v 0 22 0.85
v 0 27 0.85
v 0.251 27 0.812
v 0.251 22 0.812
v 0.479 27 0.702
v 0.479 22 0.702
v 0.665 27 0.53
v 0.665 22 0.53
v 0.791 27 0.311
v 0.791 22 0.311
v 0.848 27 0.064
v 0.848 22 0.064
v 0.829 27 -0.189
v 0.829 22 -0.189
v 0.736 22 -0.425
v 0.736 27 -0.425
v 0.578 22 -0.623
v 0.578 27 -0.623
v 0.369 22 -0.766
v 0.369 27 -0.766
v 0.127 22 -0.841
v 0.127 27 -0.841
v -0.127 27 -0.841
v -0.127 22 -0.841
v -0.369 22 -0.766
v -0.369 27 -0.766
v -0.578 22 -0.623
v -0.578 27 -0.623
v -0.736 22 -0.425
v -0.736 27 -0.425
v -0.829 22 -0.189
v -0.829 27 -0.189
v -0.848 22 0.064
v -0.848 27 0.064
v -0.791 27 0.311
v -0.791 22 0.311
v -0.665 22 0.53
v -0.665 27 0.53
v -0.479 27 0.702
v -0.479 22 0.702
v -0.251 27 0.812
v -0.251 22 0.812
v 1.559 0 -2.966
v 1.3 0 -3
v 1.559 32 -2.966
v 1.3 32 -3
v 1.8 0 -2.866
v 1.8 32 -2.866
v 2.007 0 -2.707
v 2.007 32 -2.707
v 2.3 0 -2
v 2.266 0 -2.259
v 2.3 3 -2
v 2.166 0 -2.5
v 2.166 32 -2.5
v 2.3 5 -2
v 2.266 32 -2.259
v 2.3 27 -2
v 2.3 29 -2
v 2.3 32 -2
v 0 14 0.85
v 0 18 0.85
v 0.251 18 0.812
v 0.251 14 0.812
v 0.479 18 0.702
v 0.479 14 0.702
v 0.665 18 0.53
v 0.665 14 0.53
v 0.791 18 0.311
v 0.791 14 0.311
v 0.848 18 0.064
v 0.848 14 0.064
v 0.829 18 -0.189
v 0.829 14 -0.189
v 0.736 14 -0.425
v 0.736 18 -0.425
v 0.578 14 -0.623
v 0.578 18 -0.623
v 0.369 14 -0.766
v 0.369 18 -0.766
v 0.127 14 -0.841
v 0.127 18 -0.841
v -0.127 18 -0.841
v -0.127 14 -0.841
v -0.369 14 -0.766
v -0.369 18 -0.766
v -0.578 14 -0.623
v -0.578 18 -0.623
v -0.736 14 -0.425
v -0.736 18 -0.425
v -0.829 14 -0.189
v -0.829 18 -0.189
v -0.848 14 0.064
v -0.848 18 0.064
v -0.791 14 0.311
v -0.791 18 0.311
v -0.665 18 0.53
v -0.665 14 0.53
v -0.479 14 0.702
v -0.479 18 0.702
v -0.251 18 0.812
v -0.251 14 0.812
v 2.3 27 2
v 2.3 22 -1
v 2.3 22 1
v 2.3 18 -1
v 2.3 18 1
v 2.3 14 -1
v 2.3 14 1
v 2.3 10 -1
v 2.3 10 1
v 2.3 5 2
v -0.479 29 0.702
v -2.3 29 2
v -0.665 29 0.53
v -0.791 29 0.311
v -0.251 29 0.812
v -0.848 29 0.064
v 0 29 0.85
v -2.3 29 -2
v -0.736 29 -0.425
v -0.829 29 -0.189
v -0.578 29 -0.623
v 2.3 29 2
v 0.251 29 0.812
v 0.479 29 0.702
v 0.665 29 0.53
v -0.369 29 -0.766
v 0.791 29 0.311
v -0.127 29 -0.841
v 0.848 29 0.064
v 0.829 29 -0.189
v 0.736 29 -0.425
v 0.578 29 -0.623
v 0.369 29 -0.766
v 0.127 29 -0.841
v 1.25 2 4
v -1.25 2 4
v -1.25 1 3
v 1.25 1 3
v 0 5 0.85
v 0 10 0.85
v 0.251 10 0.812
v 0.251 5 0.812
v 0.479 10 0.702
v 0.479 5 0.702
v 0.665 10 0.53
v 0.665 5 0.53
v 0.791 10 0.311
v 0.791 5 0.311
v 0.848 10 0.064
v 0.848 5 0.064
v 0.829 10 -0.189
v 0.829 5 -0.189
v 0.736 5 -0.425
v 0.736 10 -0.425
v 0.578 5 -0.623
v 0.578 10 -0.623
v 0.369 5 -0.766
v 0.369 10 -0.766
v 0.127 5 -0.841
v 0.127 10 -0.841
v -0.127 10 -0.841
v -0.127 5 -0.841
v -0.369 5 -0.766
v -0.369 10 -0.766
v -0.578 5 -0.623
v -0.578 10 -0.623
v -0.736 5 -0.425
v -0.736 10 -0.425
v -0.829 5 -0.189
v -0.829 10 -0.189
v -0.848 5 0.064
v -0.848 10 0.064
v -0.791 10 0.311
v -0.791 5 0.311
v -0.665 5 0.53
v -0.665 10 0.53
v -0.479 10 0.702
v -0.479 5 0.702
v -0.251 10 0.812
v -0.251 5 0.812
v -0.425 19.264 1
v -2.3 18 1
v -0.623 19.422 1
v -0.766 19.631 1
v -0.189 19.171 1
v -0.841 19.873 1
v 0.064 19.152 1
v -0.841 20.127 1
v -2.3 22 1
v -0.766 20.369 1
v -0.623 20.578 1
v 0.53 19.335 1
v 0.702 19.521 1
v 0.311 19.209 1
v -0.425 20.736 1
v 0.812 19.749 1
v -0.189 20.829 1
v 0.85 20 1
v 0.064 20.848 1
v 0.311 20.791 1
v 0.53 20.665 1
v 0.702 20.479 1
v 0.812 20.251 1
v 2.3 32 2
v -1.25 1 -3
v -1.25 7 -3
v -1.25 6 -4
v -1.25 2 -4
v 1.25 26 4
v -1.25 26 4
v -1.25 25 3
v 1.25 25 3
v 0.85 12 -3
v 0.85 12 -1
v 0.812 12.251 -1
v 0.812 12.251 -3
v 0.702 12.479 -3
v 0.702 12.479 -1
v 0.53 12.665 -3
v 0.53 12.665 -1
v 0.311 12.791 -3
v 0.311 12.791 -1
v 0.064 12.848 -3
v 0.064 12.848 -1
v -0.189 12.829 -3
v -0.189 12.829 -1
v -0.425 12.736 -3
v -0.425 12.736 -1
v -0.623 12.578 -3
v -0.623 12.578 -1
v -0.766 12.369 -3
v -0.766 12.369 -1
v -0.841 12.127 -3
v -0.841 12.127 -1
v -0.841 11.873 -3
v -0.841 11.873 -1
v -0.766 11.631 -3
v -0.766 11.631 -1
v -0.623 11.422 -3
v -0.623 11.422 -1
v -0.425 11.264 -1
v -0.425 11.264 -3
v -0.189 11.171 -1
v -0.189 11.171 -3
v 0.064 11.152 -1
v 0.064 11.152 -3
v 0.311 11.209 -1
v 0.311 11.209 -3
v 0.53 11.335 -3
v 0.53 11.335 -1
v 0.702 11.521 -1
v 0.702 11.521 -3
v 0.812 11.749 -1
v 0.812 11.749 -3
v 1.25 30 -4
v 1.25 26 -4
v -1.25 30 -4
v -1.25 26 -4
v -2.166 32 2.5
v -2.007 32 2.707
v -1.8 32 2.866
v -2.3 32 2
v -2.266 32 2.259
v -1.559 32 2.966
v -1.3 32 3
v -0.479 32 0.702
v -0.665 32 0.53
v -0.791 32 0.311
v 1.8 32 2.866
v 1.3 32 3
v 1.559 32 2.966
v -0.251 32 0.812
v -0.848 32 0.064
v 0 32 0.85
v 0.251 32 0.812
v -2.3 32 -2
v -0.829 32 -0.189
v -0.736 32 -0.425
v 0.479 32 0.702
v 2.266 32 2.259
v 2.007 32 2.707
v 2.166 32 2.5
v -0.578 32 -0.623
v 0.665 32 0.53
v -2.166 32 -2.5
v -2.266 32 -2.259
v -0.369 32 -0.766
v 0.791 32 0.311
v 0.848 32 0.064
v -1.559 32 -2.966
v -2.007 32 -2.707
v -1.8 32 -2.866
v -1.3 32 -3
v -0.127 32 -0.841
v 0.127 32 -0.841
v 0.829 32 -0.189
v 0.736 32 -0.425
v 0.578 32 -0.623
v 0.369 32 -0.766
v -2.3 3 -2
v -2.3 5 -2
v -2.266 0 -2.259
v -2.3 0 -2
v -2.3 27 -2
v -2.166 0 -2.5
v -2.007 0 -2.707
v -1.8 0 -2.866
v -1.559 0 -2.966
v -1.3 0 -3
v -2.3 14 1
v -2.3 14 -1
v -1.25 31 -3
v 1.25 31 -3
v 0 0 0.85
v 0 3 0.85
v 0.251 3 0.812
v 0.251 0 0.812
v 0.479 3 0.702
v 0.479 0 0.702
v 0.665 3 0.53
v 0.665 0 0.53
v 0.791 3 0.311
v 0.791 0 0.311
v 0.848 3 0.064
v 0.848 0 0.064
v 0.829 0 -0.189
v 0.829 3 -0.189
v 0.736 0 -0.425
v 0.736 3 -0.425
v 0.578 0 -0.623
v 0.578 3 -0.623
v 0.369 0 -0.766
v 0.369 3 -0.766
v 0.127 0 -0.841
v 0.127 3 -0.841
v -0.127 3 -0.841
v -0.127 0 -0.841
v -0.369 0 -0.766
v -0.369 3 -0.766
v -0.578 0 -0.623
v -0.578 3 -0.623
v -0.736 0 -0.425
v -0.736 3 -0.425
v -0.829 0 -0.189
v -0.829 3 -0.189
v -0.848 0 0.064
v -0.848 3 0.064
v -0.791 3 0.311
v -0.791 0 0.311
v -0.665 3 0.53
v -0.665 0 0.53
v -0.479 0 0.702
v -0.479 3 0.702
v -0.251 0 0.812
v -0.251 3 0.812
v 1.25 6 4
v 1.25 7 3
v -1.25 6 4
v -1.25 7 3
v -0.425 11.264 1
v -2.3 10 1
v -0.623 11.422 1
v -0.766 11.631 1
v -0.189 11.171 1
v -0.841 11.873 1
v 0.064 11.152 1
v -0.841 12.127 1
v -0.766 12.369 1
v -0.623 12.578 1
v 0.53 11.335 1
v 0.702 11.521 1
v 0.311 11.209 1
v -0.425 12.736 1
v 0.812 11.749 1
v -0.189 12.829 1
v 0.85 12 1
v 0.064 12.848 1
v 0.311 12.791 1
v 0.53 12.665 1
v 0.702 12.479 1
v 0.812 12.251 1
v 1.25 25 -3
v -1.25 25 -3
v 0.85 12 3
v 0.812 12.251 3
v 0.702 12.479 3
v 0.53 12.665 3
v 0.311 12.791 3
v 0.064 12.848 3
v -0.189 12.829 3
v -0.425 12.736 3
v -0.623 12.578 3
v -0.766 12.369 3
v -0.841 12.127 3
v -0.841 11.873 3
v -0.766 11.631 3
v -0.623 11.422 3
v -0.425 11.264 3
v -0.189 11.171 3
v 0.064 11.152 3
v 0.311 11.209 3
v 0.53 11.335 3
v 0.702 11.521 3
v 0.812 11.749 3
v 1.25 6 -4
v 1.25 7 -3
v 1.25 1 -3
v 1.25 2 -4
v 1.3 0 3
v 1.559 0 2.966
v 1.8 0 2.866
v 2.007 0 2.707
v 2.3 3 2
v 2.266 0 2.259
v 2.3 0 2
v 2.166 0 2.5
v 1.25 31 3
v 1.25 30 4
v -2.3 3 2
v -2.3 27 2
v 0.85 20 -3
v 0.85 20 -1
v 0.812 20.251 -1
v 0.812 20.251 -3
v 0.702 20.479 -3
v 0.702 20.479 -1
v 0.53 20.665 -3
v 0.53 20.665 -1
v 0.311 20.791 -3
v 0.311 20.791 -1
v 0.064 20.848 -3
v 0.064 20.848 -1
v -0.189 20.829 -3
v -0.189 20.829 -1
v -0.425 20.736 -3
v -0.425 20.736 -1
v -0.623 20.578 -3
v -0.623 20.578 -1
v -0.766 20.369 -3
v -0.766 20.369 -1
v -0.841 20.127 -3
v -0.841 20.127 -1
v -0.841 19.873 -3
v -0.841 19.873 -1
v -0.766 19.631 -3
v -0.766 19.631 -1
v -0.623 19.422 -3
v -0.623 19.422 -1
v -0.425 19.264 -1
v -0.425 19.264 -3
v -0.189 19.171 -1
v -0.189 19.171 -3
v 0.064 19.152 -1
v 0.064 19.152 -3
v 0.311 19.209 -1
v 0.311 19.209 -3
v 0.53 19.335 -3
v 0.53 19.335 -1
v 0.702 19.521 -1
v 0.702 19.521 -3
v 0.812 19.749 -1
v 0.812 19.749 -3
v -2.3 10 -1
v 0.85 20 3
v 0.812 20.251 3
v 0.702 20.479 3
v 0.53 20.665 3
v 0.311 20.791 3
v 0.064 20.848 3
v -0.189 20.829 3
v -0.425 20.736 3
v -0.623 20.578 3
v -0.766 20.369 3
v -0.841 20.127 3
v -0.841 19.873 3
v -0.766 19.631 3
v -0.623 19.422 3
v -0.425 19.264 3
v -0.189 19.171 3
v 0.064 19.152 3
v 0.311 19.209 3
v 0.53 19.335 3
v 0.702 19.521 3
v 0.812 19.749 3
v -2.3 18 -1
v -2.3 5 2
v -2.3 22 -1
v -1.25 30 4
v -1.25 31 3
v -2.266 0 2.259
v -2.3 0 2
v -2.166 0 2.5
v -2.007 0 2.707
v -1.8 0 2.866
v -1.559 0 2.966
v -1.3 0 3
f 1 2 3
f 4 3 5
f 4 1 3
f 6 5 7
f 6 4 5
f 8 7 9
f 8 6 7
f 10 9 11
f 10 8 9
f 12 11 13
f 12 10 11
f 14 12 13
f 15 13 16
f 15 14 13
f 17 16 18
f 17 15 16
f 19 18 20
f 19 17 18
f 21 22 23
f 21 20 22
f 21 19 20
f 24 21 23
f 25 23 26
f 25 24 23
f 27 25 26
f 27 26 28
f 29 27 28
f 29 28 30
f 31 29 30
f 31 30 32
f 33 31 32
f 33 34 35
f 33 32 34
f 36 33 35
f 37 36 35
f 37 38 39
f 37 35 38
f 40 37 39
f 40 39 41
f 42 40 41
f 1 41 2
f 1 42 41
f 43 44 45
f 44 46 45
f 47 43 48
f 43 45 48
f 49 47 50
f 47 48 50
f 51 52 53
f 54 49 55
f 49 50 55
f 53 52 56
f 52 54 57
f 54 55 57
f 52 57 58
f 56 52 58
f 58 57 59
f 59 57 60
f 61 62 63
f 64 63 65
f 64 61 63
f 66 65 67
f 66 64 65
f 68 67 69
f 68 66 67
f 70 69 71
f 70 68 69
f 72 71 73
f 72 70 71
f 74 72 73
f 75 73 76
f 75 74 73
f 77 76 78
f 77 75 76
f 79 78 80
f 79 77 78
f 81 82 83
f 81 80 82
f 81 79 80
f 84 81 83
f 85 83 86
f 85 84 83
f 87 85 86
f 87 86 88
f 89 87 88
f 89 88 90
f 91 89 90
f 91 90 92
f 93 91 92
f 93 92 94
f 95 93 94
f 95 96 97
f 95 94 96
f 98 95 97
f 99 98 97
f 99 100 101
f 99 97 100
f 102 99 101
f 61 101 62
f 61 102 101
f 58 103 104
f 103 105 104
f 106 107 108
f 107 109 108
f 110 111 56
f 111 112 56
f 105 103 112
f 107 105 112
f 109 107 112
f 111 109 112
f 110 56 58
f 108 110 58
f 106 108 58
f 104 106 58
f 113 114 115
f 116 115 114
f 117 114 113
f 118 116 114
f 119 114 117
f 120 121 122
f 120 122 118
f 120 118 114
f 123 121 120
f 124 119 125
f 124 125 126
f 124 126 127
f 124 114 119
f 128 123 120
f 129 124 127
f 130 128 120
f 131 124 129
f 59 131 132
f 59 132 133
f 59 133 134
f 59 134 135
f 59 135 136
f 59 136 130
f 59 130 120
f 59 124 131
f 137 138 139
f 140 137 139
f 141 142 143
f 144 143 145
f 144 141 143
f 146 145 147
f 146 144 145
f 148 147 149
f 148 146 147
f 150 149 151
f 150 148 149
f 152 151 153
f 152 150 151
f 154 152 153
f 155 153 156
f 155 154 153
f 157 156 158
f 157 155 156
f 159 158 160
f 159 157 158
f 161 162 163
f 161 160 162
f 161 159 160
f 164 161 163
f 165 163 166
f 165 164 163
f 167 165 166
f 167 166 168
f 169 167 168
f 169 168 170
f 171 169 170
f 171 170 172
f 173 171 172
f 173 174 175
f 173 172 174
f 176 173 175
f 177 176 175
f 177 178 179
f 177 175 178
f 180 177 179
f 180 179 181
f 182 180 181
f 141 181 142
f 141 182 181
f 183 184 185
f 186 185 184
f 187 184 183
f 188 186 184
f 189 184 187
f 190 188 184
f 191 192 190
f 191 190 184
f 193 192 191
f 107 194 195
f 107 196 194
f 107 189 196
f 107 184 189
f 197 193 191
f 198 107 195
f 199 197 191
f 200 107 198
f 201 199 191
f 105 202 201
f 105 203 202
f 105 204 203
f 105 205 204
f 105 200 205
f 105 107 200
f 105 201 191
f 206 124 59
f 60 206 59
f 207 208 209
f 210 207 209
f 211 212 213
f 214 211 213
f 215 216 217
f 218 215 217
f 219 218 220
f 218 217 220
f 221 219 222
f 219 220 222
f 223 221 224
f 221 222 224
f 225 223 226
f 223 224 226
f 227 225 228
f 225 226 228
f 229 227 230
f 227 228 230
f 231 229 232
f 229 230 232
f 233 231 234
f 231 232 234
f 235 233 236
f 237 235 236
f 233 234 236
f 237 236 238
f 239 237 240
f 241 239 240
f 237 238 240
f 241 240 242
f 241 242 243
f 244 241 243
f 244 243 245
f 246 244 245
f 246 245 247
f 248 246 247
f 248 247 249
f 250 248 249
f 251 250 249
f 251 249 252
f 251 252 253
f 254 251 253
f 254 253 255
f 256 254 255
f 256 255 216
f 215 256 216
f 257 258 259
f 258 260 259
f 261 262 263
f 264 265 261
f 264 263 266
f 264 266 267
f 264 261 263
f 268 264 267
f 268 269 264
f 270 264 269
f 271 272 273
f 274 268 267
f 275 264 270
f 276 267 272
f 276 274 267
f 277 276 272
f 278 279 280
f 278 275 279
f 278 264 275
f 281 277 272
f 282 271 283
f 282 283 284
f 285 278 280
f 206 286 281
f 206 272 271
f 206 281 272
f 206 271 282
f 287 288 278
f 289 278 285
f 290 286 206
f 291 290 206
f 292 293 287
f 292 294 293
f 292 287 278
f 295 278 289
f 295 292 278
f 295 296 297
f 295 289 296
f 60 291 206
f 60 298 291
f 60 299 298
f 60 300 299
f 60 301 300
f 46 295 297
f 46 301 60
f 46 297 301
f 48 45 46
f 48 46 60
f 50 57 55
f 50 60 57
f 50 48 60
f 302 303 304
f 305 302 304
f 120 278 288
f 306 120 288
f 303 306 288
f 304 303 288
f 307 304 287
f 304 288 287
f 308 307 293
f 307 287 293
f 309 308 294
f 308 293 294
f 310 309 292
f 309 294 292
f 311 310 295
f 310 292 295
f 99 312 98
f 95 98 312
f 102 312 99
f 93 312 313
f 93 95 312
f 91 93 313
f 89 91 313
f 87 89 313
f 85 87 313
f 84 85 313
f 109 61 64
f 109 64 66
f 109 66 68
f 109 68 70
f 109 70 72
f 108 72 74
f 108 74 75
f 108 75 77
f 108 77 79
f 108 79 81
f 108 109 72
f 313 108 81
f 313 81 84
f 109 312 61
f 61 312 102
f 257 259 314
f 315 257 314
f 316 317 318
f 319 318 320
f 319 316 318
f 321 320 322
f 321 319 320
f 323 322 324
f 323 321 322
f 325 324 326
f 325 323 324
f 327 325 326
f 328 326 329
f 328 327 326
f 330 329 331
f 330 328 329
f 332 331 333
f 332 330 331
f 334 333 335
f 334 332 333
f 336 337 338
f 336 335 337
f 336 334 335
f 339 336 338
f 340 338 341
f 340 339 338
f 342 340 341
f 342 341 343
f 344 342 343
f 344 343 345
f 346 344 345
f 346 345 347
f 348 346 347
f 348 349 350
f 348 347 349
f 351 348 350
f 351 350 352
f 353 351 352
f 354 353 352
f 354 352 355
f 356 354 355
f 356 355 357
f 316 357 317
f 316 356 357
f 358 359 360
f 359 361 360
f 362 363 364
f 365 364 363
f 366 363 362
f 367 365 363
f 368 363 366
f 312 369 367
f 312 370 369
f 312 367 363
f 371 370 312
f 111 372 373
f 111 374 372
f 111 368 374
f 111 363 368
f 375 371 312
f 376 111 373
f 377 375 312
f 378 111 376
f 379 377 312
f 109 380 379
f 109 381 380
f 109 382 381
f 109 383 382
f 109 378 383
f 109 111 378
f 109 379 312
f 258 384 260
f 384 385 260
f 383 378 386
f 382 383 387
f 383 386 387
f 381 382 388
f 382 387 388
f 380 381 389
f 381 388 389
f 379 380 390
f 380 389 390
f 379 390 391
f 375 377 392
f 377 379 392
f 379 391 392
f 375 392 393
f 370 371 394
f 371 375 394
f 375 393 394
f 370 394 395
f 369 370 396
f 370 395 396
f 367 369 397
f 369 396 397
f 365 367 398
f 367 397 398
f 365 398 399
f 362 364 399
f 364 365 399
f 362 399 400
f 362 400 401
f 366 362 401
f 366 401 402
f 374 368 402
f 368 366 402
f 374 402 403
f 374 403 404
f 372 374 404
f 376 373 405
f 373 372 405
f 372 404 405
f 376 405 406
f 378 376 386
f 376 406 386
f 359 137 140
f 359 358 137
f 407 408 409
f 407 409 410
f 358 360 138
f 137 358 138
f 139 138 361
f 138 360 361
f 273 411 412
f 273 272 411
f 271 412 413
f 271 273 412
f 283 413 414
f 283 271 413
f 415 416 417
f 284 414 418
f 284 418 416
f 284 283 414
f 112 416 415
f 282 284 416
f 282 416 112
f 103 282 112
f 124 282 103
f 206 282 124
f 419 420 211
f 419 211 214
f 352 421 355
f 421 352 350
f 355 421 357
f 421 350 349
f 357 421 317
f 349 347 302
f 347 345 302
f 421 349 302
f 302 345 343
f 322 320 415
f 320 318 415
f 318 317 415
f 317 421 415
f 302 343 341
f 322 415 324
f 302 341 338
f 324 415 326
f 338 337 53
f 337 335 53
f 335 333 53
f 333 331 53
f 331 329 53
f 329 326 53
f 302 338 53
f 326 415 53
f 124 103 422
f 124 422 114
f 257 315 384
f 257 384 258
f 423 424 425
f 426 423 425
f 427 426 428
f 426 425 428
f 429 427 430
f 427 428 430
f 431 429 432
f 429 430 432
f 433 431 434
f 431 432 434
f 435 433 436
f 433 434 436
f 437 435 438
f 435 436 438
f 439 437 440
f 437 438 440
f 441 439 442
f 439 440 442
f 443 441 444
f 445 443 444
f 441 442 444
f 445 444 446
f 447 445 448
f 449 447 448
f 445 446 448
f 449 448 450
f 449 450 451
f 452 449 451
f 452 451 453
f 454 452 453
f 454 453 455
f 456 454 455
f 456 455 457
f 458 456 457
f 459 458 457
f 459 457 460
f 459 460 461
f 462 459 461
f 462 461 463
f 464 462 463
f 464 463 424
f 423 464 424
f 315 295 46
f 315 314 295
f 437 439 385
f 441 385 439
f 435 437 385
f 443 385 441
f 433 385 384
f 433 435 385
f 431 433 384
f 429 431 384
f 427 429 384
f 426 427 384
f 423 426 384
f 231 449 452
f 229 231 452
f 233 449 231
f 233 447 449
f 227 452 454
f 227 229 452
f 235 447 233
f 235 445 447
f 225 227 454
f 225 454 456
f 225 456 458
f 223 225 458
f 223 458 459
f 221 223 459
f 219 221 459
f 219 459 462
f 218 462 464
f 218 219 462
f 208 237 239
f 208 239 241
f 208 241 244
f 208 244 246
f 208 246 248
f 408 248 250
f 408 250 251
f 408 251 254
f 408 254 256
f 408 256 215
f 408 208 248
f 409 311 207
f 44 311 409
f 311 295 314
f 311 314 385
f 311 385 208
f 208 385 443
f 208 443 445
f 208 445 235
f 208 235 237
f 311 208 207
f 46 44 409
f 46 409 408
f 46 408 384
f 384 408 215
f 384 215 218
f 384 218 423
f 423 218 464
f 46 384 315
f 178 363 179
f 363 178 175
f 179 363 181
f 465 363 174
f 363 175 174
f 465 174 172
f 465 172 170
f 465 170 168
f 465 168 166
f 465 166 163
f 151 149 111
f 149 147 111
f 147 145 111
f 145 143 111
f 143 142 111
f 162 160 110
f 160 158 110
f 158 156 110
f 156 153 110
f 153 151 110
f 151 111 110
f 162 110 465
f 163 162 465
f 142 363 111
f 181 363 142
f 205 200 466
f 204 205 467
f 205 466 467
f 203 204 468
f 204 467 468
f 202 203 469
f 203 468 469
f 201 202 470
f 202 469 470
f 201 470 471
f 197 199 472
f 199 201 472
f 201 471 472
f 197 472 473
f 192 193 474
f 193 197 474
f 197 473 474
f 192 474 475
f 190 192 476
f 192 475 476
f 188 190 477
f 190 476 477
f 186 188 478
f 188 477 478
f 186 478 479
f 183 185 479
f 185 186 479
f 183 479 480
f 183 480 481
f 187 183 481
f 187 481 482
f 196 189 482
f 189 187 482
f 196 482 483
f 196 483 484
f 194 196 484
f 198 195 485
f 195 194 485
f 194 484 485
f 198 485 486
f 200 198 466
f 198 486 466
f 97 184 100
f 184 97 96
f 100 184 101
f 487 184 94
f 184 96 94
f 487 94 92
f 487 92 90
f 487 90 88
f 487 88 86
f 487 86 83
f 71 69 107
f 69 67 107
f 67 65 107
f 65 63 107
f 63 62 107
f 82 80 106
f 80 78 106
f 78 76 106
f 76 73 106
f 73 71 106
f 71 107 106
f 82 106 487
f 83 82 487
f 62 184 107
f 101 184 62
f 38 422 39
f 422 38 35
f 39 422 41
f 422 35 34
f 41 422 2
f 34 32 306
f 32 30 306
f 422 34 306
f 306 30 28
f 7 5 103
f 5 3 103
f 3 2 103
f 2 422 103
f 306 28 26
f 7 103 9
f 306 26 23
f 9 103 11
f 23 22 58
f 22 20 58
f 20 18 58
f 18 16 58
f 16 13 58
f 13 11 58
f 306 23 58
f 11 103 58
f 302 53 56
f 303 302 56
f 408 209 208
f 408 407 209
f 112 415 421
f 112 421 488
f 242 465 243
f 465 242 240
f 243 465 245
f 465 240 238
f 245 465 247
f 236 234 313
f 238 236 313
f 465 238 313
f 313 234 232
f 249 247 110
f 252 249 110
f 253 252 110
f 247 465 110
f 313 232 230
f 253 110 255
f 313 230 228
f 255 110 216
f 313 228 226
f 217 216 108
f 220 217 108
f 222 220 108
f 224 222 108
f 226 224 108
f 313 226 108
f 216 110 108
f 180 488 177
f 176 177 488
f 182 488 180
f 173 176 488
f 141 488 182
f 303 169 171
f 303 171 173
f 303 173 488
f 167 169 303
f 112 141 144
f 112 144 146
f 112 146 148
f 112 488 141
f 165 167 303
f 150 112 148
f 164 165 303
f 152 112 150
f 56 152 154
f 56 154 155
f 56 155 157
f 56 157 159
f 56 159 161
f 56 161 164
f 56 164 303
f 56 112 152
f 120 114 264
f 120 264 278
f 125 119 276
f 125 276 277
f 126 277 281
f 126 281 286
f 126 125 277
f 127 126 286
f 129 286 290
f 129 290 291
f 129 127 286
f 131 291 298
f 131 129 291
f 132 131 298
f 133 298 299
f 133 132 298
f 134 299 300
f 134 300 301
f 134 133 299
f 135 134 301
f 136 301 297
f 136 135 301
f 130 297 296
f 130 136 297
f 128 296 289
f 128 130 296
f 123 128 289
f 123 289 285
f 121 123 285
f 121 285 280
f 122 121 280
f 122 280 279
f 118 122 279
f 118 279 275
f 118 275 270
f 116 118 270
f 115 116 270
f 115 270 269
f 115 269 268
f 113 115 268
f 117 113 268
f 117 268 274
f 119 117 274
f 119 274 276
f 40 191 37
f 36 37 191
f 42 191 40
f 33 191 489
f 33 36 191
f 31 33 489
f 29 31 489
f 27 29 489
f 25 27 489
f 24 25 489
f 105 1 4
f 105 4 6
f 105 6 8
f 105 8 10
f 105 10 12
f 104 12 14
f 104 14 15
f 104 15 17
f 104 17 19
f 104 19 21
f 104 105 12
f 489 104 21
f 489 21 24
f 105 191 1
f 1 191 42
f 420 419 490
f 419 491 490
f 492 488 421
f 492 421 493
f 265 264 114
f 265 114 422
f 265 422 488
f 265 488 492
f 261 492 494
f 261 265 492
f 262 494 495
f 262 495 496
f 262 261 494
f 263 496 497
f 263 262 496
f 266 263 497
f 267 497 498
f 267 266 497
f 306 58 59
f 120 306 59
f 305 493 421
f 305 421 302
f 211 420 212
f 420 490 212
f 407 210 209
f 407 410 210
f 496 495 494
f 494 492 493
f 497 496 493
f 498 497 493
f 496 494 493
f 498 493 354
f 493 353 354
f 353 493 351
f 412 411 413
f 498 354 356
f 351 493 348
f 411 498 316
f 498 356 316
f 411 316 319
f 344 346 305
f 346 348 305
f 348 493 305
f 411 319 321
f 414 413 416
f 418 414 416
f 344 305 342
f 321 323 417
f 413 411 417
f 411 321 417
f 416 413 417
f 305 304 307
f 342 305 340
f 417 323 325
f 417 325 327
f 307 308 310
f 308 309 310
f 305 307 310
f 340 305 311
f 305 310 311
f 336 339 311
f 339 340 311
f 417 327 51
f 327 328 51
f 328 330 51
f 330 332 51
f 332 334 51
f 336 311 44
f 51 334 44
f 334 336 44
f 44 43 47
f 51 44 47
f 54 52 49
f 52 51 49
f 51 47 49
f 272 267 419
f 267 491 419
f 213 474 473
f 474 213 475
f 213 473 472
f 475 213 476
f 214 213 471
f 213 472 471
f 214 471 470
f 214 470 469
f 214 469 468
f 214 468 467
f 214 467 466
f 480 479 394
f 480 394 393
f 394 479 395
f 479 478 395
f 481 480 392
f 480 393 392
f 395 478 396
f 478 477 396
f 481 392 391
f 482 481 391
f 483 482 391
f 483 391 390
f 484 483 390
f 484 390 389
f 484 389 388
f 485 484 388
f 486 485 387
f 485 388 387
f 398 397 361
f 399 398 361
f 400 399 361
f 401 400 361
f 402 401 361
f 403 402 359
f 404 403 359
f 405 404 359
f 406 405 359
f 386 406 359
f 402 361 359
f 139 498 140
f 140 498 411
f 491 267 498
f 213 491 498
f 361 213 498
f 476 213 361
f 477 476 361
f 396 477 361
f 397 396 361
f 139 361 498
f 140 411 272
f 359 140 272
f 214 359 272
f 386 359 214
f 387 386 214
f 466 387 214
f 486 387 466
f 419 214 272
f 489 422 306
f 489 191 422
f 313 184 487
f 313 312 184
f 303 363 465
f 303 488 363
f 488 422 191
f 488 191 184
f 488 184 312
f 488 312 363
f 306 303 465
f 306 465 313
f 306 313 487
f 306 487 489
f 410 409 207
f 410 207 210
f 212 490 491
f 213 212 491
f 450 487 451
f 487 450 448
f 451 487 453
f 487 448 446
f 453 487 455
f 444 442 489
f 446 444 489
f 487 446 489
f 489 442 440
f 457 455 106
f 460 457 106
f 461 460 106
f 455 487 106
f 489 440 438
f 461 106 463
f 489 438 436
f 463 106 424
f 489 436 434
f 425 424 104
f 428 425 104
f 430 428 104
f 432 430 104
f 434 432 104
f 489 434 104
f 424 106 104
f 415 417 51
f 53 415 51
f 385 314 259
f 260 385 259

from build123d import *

# Parameters (mm, degrees)
SKETCH1_W           = 4.6
SKETCH1_H           = 6
SKETCH1_R           = 0.85
EXTRUDE1_DEPTH      = 32
EXTRUDE2_DEPTH      = 1.25
SKETCH3_R           = 0.85
EXTRUDE4_DEPTH      = 8
FILLET2_R           = 1
SKETCH_W            = 4
SKETCH_H            = 2
EXTRUDE5_DEPTH      = 4.6
EXTRUDE5_DEPTH_BACK = 4.6
SKETCH4_W           = 2
SKETCH4_H           = 4
EXTRUDE6_DEPTH      = 3.3
EXTRUDE6_DEPTH_BACK = 3.3


with BuildPart() as part:
    # Sketch1 → Extrude1 (new body)
    with BuildSketch(Plane(origin=(0, 0, 0), x_dir=(1, 0, 0), z_dir=(0, 1, 0))):
        Rectangle(SKETCH1_W, SKETCH1_H)
        with Locations(Location((0, 0, 0), (0, 0, 270))):  # turned: the seam where the file's is
            Circle(SKETCH1_R, mode=Mode.SUBTRACT)
    extrude(amount=EXTRUDE1_DEPTH)

    # Sketch2 → Extrude2 (add, symmetric)
    with BuildSketch(Plane(origin=(0, 0, 0), x_dir=(0, 0, -1), z_dir=(1, 0, 0))):
        Polygon((-3, 25), (-3, 31), (-4, 30), (-4, 26), align=None)
        Polygon((3, 31), (3, 25), (4, 26), (4, 30), align=None)
        Polygon((-4, 2), (-3, 1), (-3, 7), (-4, 6), align=None)
        Polygon((4, 6), (3, 7), (3, 1), (4, 2), align=None)
    extrude(amount=EXTRUDE2_DEPTH, both=True)

    # Sketch3 → Extrude4 (cut, through all)
    with BuildSketch(Plane.XY.offset(3)):
        with Locations((0, 20)):
            Circle(SKETCH3_R)
        with Locations((0, 12)):
            Circle(SKETCH3_R)
    extrude(amount=-EXTRUDE4_DEPTH, mode=Mode.SUBTRACT)

    # Fillet2
    fillet2_edges = [part.edges().sort_by_distance(p)[0] for p in [
        (-2.3, 16, -3),
        (2.3, 16, -3),
        (2.3, 16, 3),
        (-2.3, 16, 3),
    ]]
    fillet(fillet2_edges, radius=FILLET2_R)

    # Sketch → Extrude5 (cut, two sides)
    with BuildSketch(Plane(origin=(0, 0, 0), x_dir=(0, 0, -1), z_dir=(1, 0, 0))) as extrude5_sk:
        with Locations((0, 28)):
            Rectangle(SKETCH_W, SKETCH_H)
        with Locations((0, 4)):
            Rectangle(SKETCH_W, SKETCH_H)
    extrude(amount=EXTRUDE5_DEPTH, mode=Mode.SUBTRACT)
    extrude(extrude5_sk.sketch, amount=-EXTRUDE5_DEPTH_BACK, mode=Mode.SUBTRACT)

    # Sketch4 → Extrude6 (cut, two sides)
    with BuildSketch(Plane(origin=(0, 0, 0), x_dir=(0, 0, -1), z_dir=(1, 0, 0))) as extrude6_sk:
        with Locations((0, 20)):
            Rectangle(SKETCH4_W, SKETCH4_H)
        with Locations((0, 12)):
            Rectangle(SKETCH4_W, SKETCH4_H)
    extrude(amount=EXTRUDE6_DEPTH, mode=Mode.SUBTRACT)
    extrude(extrude6_sk.sketch, amount=-EXTRUDE6_DEPTH_BACK, mode=Mode.SUBTRACT)


solid = part.part
